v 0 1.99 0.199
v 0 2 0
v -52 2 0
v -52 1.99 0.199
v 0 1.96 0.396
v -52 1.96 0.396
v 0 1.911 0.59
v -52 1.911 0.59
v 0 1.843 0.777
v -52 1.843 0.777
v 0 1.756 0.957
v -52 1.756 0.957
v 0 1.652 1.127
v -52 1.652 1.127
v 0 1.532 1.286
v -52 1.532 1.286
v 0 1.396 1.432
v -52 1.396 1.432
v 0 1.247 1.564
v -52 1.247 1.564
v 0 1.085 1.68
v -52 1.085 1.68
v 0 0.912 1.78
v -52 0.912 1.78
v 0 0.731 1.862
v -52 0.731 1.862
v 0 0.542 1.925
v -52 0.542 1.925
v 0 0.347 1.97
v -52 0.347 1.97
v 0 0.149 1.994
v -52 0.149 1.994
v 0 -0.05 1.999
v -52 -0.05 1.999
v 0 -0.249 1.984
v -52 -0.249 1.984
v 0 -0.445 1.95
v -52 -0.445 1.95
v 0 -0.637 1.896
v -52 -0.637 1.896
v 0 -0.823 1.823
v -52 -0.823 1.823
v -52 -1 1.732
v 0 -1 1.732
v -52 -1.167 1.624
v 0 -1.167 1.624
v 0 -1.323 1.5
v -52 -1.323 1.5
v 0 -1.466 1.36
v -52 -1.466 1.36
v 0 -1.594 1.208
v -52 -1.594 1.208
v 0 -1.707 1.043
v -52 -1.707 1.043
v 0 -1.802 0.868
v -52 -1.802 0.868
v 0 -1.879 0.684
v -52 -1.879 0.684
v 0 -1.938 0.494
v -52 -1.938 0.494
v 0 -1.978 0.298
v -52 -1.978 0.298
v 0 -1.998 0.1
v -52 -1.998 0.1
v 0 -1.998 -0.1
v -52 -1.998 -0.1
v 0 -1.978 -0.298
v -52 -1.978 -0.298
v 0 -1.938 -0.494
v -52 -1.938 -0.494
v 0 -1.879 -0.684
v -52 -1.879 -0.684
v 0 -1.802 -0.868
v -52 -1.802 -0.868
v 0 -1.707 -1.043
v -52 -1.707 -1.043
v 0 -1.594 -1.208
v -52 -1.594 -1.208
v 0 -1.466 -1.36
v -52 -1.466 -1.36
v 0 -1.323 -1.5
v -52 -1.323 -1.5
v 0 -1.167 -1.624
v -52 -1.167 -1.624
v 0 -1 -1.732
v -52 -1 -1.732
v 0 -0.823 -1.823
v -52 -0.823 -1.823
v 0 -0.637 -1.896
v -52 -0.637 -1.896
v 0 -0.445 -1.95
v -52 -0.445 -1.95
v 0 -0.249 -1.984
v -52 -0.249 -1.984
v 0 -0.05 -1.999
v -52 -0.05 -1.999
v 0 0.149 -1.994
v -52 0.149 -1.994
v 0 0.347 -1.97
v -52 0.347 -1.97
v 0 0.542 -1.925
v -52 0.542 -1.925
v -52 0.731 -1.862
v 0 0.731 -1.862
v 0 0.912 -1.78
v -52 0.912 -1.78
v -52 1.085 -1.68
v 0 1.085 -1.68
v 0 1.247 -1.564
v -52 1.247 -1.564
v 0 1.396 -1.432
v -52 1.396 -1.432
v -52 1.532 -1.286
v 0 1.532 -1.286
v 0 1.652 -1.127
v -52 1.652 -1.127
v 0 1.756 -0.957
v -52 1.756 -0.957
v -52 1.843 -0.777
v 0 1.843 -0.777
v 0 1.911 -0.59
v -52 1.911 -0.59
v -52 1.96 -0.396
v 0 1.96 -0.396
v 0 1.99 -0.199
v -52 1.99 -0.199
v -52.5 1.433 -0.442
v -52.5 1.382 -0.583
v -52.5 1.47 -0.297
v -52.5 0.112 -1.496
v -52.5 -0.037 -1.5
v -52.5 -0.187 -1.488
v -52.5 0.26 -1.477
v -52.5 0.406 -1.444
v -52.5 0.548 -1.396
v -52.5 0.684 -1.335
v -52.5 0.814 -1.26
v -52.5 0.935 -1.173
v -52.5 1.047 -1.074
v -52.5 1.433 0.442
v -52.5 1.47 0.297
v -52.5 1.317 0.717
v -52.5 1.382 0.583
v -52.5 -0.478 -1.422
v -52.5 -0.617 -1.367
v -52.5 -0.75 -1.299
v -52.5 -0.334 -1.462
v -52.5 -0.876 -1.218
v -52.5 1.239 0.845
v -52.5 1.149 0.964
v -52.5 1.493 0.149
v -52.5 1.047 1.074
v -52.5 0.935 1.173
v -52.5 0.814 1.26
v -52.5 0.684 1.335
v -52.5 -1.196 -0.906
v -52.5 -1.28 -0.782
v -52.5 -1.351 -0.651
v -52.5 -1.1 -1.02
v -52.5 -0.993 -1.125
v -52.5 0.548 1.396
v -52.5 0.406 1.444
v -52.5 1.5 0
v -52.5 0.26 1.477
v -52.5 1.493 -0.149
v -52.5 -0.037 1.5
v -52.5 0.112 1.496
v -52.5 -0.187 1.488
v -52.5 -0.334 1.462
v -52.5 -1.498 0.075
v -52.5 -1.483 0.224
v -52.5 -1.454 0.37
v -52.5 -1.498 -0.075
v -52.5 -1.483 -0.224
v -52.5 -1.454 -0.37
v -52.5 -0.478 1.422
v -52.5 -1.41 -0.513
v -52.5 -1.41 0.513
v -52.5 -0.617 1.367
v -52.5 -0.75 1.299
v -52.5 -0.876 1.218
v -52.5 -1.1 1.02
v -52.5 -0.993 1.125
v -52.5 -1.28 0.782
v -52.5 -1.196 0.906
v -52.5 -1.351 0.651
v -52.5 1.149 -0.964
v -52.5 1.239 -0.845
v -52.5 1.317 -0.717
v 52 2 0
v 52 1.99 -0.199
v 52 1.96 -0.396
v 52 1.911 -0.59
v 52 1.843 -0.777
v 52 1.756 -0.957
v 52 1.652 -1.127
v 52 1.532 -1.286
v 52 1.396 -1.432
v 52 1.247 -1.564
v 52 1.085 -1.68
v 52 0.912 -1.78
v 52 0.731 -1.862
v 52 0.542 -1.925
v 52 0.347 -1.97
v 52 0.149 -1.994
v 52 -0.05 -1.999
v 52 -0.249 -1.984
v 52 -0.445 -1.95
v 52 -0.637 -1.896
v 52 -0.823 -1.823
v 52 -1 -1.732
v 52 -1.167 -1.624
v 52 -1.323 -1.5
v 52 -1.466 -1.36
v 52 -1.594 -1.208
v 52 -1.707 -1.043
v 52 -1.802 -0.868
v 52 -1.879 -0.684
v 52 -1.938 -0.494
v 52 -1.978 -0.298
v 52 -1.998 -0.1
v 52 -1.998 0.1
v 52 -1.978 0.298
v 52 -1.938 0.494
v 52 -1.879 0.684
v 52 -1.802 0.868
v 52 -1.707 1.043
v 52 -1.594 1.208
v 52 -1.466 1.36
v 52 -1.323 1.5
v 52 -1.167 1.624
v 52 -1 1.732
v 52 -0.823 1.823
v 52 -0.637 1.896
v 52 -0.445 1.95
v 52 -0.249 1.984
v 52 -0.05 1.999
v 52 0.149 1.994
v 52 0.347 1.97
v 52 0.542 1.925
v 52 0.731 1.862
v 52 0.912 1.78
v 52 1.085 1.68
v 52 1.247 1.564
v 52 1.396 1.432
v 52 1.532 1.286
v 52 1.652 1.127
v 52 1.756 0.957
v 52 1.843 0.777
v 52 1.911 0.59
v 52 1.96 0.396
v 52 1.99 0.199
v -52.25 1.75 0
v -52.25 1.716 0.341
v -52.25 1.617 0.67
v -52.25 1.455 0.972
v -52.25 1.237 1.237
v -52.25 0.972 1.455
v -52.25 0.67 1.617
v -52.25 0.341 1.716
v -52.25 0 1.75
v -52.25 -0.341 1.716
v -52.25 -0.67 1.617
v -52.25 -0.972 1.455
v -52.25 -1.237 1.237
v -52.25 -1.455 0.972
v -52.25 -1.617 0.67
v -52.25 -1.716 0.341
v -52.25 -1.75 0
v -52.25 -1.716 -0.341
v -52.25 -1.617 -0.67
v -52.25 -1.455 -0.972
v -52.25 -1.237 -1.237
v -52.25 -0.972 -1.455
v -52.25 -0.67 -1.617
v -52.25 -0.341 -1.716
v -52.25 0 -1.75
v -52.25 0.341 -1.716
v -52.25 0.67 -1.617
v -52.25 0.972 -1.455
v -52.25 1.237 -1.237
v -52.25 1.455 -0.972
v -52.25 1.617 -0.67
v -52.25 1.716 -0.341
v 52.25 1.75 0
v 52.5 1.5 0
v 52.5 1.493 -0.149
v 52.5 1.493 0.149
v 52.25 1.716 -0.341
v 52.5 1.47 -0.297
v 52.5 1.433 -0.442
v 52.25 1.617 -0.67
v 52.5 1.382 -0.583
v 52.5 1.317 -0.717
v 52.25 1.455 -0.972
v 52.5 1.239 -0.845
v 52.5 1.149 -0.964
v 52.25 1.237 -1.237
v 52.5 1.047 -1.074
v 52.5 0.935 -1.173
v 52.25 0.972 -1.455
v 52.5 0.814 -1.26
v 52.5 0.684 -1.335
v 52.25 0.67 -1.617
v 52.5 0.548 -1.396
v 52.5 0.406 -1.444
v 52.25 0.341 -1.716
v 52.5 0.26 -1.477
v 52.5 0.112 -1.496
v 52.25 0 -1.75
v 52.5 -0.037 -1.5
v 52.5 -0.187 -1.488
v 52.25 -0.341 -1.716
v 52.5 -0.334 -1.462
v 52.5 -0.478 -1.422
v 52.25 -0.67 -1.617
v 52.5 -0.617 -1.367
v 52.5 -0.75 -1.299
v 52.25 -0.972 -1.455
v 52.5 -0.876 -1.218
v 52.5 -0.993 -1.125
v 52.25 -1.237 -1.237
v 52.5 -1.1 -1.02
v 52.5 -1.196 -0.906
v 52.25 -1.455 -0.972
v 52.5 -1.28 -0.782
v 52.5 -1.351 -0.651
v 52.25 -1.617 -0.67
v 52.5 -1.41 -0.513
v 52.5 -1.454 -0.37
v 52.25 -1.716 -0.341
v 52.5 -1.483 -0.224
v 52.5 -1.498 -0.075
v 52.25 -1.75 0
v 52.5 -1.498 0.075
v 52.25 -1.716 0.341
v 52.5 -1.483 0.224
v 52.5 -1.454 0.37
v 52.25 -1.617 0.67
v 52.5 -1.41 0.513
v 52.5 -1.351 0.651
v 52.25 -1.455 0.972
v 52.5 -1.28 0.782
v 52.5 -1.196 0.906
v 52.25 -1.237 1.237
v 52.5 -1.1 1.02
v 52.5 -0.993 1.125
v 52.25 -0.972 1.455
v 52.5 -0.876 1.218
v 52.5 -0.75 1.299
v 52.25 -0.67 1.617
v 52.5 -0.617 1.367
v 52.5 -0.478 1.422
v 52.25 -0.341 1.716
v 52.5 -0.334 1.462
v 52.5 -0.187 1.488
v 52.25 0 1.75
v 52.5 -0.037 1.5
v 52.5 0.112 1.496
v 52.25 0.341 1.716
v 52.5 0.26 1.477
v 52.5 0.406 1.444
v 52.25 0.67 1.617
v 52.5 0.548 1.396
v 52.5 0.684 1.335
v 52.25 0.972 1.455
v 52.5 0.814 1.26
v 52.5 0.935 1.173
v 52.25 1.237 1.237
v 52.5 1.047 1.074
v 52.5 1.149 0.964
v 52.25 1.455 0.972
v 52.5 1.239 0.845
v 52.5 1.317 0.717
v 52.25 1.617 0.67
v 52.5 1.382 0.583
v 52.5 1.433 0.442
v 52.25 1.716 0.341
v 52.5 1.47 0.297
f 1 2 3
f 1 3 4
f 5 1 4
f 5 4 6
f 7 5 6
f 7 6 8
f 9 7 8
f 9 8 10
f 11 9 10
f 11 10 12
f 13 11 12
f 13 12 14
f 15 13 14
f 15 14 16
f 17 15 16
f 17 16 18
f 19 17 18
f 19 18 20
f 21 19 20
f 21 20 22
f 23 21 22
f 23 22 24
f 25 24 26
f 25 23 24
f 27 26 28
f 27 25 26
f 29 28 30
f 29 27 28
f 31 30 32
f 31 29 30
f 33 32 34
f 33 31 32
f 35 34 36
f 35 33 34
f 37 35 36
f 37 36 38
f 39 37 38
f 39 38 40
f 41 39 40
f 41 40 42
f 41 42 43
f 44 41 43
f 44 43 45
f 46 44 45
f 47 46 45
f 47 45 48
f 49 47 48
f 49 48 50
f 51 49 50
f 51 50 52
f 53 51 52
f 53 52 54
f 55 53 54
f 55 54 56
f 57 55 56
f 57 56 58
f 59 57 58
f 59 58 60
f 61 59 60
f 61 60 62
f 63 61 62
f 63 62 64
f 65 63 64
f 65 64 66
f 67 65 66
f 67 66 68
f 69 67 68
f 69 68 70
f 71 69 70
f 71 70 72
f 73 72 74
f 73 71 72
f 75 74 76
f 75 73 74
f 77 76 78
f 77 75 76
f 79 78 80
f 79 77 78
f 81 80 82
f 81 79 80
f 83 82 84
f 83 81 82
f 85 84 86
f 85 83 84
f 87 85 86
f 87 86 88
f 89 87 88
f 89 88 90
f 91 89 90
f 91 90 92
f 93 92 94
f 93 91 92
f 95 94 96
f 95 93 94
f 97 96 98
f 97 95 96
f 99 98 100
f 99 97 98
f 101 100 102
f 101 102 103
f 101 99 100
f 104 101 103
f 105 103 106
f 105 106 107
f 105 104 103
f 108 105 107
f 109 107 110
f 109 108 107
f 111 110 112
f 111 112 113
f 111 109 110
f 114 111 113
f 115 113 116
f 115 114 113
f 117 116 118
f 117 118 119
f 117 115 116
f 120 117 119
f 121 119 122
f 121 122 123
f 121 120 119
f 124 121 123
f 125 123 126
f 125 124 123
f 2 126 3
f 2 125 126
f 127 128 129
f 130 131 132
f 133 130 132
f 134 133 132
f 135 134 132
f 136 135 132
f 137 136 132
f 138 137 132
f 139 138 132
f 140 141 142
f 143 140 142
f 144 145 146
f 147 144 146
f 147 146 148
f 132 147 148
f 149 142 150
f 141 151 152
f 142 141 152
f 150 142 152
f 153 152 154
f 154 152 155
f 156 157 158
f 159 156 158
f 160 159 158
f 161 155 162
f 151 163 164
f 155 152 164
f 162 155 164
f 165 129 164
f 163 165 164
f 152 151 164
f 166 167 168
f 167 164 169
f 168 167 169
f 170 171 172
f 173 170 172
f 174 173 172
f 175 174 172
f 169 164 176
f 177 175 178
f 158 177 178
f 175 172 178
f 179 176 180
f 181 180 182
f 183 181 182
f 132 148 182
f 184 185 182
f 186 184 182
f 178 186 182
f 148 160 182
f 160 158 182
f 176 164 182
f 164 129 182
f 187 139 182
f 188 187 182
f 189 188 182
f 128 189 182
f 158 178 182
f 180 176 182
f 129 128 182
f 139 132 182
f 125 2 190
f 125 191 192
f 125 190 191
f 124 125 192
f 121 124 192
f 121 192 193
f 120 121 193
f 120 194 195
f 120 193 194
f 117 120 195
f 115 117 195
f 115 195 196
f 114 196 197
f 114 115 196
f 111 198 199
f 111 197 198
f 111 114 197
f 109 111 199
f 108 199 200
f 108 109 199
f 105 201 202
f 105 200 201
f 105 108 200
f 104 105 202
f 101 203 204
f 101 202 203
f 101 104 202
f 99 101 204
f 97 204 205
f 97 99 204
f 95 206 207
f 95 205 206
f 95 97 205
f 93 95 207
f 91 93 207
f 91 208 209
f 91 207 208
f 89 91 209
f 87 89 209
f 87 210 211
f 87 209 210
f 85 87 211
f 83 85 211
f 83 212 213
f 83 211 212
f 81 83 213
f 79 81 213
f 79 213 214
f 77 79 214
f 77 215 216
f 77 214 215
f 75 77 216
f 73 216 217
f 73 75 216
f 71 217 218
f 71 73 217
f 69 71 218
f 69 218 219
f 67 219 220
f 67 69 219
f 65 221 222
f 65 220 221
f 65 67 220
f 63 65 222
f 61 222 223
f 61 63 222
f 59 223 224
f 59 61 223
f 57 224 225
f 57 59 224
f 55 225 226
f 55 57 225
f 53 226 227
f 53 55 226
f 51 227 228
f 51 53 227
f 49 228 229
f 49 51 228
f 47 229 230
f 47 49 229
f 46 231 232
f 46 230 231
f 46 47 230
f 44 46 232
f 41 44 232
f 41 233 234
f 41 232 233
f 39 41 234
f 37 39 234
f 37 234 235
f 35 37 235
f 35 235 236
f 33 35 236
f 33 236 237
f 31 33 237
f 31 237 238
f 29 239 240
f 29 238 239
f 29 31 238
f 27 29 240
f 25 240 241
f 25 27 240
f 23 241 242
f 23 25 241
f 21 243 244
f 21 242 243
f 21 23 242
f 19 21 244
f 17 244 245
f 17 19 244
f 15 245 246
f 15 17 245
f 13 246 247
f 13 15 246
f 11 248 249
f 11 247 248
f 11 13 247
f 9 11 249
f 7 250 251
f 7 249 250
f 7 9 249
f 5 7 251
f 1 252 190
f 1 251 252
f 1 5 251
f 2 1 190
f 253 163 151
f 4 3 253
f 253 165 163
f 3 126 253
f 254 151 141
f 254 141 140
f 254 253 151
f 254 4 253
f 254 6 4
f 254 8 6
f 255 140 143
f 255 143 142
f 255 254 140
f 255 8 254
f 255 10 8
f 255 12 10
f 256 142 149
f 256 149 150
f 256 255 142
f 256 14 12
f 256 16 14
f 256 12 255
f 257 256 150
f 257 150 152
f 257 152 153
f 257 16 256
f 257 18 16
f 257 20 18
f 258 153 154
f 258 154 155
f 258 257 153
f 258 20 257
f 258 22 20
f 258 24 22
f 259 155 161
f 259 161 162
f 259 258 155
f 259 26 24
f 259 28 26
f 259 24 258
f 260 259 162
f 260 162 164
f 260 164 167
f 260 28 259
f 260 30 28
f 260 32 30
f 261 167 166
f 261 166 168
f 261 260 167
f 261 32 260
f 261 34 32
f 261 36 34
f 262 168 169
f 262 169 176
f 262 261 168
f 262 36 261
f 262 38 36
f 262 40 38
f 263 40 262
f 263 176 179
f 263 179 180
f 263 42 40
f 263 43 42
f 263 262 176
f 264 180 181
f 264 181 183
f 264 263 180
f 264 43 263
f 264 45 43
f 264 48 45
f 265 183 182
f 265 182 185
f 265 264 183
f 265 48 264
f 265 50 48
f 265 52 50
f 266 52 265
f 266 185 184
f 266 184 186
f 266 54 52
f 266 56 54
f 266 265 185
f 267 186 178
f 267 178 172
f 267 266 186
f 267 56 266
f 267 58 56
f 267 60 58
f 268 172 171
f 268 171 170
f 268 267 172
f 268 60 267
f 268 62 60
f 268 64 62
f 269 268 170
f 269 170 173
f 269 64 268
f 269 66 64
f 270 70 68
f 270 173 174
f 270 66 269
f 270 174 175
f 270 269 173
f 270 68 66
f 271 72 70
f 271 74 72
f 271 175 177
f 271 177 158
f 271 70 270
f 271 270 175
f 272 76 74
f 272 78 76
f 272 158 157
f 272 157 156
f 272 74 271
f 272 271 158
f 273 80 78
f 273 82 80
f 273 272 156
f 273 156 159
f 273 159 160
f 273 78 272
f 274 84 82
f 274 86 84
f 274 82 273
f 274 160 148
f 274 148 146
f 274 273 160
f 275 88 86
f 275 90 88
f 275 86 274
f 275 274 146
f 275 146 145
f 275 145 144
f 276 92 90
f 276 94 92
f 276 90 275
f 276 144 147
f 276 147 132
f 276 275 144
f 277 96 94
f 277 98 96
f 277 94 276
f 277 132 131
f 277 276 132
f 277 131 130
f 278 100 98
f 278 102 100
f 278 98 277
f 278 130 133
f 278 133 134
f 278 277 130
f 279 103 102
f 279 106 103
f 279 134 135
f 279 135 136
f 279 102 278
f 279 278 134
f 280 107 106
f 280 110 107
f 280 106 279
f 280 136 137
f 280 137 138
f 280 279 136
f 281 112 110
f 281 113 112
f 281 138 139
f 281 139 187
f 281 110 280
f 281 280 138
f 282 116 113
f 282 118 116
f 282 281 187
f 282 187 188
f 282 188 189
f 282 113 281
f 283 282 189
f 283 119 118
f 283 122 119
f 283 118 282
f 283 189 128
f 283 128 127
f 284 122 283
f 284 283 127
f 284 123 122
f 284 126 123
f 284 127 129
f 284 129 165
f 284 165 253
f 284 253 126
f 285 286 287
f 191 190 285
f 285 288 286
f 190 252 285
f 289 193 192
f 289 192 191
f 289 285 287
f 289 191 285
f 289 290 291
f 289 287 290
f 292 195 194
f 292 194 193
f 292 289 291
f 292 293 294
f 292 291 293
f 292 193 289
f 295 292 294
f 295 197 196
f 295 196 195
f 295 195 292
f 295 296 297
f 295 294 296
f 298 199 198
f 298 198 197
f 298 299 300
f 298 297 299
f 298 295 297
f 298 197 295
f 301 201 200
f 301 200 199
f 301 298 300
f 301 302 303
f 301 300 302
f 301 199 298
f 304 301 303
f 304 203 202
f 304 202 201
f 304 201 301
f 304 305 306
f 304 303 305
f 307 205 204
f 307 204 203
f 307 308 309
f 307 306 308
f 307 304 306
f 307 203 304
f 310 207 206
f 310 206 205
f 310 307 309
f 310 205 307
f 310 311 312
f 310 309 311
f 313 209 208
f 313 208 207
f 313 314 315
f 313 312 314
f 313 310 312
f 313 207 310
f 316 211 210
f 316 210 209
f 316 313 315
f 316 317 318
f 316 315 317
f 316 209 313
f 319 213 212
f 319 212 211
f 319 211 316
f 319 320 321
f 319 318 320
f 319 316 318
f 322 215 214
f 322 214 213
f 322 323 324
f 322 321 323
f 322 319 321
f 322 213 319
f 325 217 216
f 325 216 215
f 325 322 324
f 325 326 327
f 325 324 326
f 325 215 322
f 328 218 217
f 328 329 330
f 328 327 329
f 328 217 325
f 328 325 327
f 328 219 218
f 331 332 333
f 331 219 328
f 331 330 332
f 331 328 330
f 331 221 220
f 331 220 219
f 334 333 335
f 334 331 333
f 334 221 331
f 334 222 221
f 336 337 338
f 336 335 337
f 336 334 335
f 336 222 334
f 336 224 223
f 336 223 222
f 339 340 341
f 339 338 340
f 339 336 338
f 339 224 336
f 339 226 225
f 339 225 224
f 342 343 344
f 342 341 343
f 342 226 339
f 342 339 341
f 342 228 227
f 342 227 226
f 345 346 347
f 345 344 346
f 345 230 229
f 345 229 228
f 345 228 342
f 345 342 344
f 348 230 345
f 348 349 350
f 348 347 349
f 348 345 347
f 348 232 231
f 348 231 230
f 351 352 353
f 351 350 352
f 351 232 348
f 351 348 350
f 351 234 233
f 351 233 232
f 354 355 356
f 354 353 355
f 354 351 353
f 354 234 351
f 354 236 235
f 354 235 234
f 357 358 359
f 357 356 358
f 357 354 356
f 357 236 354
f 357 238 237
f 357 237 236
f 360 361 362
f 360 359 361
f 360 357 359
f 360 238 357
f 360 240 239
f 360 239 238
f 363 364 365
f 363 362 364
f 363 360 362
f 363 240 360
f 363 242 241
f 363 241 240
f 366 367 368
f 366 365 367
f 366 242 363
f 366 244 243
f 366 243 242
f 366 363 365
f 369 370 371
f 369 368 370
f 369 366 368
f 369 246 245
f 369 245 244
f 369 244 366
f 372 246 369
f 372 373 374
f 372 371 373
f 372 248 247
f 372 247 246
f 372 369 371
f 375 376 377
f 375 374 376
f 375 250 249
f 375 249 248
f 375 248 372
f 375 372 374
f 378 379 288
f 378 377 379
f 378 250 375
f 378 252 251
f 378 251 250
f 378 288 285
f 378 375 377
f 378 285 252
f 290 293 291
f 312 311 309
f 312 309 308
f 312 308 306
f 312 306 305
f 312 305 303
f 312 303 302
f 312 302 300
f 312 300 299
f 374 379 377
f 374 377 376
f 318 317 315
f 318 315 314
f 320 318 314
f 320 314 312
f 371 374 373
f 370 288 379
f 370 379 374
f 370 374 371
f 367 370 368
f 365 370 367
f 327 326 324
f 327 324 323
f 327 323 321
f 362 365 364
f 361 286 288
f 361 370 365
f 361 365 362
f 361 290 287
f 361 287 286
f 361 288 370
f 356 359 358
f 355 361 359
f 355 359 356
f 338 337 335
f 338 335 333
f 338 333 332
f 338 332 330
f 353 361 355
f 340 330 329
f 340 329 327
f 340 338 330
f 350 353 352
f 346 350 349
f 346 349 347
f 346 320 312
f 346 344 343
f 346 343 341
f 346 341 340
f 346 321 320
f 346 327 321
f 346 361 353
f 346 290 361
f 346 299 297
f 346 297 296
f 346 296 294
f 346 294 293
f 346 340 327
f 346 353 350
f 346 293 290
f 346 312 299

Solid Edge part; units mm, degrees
sketch "Sketch1" plane through (0, 0, 0) normal (1, 0, 0) x (0, 1, 0)
  circle A0 centre (0, 0) radius 2
extrude "Protrusion1" add sketch "Sketch1" along normal mid plane 105
cosmetic_thread "Thread_1" size "M4" thread depth 8
cosmetic_thread "Thread_2" size "M4" thread depth 8
chamfer "Chamfer_1" distance 0.5 angle 45 1 edges at (52.5, -2, 0) measured on face at (52.5, 1.2933, -1.3733)
chamfer "Chamfer_2" distance 0.5 angle 45 1 edges at (-52.5, -2, 0) measured on face at (-52.5, 1.2933, -1.3733)
